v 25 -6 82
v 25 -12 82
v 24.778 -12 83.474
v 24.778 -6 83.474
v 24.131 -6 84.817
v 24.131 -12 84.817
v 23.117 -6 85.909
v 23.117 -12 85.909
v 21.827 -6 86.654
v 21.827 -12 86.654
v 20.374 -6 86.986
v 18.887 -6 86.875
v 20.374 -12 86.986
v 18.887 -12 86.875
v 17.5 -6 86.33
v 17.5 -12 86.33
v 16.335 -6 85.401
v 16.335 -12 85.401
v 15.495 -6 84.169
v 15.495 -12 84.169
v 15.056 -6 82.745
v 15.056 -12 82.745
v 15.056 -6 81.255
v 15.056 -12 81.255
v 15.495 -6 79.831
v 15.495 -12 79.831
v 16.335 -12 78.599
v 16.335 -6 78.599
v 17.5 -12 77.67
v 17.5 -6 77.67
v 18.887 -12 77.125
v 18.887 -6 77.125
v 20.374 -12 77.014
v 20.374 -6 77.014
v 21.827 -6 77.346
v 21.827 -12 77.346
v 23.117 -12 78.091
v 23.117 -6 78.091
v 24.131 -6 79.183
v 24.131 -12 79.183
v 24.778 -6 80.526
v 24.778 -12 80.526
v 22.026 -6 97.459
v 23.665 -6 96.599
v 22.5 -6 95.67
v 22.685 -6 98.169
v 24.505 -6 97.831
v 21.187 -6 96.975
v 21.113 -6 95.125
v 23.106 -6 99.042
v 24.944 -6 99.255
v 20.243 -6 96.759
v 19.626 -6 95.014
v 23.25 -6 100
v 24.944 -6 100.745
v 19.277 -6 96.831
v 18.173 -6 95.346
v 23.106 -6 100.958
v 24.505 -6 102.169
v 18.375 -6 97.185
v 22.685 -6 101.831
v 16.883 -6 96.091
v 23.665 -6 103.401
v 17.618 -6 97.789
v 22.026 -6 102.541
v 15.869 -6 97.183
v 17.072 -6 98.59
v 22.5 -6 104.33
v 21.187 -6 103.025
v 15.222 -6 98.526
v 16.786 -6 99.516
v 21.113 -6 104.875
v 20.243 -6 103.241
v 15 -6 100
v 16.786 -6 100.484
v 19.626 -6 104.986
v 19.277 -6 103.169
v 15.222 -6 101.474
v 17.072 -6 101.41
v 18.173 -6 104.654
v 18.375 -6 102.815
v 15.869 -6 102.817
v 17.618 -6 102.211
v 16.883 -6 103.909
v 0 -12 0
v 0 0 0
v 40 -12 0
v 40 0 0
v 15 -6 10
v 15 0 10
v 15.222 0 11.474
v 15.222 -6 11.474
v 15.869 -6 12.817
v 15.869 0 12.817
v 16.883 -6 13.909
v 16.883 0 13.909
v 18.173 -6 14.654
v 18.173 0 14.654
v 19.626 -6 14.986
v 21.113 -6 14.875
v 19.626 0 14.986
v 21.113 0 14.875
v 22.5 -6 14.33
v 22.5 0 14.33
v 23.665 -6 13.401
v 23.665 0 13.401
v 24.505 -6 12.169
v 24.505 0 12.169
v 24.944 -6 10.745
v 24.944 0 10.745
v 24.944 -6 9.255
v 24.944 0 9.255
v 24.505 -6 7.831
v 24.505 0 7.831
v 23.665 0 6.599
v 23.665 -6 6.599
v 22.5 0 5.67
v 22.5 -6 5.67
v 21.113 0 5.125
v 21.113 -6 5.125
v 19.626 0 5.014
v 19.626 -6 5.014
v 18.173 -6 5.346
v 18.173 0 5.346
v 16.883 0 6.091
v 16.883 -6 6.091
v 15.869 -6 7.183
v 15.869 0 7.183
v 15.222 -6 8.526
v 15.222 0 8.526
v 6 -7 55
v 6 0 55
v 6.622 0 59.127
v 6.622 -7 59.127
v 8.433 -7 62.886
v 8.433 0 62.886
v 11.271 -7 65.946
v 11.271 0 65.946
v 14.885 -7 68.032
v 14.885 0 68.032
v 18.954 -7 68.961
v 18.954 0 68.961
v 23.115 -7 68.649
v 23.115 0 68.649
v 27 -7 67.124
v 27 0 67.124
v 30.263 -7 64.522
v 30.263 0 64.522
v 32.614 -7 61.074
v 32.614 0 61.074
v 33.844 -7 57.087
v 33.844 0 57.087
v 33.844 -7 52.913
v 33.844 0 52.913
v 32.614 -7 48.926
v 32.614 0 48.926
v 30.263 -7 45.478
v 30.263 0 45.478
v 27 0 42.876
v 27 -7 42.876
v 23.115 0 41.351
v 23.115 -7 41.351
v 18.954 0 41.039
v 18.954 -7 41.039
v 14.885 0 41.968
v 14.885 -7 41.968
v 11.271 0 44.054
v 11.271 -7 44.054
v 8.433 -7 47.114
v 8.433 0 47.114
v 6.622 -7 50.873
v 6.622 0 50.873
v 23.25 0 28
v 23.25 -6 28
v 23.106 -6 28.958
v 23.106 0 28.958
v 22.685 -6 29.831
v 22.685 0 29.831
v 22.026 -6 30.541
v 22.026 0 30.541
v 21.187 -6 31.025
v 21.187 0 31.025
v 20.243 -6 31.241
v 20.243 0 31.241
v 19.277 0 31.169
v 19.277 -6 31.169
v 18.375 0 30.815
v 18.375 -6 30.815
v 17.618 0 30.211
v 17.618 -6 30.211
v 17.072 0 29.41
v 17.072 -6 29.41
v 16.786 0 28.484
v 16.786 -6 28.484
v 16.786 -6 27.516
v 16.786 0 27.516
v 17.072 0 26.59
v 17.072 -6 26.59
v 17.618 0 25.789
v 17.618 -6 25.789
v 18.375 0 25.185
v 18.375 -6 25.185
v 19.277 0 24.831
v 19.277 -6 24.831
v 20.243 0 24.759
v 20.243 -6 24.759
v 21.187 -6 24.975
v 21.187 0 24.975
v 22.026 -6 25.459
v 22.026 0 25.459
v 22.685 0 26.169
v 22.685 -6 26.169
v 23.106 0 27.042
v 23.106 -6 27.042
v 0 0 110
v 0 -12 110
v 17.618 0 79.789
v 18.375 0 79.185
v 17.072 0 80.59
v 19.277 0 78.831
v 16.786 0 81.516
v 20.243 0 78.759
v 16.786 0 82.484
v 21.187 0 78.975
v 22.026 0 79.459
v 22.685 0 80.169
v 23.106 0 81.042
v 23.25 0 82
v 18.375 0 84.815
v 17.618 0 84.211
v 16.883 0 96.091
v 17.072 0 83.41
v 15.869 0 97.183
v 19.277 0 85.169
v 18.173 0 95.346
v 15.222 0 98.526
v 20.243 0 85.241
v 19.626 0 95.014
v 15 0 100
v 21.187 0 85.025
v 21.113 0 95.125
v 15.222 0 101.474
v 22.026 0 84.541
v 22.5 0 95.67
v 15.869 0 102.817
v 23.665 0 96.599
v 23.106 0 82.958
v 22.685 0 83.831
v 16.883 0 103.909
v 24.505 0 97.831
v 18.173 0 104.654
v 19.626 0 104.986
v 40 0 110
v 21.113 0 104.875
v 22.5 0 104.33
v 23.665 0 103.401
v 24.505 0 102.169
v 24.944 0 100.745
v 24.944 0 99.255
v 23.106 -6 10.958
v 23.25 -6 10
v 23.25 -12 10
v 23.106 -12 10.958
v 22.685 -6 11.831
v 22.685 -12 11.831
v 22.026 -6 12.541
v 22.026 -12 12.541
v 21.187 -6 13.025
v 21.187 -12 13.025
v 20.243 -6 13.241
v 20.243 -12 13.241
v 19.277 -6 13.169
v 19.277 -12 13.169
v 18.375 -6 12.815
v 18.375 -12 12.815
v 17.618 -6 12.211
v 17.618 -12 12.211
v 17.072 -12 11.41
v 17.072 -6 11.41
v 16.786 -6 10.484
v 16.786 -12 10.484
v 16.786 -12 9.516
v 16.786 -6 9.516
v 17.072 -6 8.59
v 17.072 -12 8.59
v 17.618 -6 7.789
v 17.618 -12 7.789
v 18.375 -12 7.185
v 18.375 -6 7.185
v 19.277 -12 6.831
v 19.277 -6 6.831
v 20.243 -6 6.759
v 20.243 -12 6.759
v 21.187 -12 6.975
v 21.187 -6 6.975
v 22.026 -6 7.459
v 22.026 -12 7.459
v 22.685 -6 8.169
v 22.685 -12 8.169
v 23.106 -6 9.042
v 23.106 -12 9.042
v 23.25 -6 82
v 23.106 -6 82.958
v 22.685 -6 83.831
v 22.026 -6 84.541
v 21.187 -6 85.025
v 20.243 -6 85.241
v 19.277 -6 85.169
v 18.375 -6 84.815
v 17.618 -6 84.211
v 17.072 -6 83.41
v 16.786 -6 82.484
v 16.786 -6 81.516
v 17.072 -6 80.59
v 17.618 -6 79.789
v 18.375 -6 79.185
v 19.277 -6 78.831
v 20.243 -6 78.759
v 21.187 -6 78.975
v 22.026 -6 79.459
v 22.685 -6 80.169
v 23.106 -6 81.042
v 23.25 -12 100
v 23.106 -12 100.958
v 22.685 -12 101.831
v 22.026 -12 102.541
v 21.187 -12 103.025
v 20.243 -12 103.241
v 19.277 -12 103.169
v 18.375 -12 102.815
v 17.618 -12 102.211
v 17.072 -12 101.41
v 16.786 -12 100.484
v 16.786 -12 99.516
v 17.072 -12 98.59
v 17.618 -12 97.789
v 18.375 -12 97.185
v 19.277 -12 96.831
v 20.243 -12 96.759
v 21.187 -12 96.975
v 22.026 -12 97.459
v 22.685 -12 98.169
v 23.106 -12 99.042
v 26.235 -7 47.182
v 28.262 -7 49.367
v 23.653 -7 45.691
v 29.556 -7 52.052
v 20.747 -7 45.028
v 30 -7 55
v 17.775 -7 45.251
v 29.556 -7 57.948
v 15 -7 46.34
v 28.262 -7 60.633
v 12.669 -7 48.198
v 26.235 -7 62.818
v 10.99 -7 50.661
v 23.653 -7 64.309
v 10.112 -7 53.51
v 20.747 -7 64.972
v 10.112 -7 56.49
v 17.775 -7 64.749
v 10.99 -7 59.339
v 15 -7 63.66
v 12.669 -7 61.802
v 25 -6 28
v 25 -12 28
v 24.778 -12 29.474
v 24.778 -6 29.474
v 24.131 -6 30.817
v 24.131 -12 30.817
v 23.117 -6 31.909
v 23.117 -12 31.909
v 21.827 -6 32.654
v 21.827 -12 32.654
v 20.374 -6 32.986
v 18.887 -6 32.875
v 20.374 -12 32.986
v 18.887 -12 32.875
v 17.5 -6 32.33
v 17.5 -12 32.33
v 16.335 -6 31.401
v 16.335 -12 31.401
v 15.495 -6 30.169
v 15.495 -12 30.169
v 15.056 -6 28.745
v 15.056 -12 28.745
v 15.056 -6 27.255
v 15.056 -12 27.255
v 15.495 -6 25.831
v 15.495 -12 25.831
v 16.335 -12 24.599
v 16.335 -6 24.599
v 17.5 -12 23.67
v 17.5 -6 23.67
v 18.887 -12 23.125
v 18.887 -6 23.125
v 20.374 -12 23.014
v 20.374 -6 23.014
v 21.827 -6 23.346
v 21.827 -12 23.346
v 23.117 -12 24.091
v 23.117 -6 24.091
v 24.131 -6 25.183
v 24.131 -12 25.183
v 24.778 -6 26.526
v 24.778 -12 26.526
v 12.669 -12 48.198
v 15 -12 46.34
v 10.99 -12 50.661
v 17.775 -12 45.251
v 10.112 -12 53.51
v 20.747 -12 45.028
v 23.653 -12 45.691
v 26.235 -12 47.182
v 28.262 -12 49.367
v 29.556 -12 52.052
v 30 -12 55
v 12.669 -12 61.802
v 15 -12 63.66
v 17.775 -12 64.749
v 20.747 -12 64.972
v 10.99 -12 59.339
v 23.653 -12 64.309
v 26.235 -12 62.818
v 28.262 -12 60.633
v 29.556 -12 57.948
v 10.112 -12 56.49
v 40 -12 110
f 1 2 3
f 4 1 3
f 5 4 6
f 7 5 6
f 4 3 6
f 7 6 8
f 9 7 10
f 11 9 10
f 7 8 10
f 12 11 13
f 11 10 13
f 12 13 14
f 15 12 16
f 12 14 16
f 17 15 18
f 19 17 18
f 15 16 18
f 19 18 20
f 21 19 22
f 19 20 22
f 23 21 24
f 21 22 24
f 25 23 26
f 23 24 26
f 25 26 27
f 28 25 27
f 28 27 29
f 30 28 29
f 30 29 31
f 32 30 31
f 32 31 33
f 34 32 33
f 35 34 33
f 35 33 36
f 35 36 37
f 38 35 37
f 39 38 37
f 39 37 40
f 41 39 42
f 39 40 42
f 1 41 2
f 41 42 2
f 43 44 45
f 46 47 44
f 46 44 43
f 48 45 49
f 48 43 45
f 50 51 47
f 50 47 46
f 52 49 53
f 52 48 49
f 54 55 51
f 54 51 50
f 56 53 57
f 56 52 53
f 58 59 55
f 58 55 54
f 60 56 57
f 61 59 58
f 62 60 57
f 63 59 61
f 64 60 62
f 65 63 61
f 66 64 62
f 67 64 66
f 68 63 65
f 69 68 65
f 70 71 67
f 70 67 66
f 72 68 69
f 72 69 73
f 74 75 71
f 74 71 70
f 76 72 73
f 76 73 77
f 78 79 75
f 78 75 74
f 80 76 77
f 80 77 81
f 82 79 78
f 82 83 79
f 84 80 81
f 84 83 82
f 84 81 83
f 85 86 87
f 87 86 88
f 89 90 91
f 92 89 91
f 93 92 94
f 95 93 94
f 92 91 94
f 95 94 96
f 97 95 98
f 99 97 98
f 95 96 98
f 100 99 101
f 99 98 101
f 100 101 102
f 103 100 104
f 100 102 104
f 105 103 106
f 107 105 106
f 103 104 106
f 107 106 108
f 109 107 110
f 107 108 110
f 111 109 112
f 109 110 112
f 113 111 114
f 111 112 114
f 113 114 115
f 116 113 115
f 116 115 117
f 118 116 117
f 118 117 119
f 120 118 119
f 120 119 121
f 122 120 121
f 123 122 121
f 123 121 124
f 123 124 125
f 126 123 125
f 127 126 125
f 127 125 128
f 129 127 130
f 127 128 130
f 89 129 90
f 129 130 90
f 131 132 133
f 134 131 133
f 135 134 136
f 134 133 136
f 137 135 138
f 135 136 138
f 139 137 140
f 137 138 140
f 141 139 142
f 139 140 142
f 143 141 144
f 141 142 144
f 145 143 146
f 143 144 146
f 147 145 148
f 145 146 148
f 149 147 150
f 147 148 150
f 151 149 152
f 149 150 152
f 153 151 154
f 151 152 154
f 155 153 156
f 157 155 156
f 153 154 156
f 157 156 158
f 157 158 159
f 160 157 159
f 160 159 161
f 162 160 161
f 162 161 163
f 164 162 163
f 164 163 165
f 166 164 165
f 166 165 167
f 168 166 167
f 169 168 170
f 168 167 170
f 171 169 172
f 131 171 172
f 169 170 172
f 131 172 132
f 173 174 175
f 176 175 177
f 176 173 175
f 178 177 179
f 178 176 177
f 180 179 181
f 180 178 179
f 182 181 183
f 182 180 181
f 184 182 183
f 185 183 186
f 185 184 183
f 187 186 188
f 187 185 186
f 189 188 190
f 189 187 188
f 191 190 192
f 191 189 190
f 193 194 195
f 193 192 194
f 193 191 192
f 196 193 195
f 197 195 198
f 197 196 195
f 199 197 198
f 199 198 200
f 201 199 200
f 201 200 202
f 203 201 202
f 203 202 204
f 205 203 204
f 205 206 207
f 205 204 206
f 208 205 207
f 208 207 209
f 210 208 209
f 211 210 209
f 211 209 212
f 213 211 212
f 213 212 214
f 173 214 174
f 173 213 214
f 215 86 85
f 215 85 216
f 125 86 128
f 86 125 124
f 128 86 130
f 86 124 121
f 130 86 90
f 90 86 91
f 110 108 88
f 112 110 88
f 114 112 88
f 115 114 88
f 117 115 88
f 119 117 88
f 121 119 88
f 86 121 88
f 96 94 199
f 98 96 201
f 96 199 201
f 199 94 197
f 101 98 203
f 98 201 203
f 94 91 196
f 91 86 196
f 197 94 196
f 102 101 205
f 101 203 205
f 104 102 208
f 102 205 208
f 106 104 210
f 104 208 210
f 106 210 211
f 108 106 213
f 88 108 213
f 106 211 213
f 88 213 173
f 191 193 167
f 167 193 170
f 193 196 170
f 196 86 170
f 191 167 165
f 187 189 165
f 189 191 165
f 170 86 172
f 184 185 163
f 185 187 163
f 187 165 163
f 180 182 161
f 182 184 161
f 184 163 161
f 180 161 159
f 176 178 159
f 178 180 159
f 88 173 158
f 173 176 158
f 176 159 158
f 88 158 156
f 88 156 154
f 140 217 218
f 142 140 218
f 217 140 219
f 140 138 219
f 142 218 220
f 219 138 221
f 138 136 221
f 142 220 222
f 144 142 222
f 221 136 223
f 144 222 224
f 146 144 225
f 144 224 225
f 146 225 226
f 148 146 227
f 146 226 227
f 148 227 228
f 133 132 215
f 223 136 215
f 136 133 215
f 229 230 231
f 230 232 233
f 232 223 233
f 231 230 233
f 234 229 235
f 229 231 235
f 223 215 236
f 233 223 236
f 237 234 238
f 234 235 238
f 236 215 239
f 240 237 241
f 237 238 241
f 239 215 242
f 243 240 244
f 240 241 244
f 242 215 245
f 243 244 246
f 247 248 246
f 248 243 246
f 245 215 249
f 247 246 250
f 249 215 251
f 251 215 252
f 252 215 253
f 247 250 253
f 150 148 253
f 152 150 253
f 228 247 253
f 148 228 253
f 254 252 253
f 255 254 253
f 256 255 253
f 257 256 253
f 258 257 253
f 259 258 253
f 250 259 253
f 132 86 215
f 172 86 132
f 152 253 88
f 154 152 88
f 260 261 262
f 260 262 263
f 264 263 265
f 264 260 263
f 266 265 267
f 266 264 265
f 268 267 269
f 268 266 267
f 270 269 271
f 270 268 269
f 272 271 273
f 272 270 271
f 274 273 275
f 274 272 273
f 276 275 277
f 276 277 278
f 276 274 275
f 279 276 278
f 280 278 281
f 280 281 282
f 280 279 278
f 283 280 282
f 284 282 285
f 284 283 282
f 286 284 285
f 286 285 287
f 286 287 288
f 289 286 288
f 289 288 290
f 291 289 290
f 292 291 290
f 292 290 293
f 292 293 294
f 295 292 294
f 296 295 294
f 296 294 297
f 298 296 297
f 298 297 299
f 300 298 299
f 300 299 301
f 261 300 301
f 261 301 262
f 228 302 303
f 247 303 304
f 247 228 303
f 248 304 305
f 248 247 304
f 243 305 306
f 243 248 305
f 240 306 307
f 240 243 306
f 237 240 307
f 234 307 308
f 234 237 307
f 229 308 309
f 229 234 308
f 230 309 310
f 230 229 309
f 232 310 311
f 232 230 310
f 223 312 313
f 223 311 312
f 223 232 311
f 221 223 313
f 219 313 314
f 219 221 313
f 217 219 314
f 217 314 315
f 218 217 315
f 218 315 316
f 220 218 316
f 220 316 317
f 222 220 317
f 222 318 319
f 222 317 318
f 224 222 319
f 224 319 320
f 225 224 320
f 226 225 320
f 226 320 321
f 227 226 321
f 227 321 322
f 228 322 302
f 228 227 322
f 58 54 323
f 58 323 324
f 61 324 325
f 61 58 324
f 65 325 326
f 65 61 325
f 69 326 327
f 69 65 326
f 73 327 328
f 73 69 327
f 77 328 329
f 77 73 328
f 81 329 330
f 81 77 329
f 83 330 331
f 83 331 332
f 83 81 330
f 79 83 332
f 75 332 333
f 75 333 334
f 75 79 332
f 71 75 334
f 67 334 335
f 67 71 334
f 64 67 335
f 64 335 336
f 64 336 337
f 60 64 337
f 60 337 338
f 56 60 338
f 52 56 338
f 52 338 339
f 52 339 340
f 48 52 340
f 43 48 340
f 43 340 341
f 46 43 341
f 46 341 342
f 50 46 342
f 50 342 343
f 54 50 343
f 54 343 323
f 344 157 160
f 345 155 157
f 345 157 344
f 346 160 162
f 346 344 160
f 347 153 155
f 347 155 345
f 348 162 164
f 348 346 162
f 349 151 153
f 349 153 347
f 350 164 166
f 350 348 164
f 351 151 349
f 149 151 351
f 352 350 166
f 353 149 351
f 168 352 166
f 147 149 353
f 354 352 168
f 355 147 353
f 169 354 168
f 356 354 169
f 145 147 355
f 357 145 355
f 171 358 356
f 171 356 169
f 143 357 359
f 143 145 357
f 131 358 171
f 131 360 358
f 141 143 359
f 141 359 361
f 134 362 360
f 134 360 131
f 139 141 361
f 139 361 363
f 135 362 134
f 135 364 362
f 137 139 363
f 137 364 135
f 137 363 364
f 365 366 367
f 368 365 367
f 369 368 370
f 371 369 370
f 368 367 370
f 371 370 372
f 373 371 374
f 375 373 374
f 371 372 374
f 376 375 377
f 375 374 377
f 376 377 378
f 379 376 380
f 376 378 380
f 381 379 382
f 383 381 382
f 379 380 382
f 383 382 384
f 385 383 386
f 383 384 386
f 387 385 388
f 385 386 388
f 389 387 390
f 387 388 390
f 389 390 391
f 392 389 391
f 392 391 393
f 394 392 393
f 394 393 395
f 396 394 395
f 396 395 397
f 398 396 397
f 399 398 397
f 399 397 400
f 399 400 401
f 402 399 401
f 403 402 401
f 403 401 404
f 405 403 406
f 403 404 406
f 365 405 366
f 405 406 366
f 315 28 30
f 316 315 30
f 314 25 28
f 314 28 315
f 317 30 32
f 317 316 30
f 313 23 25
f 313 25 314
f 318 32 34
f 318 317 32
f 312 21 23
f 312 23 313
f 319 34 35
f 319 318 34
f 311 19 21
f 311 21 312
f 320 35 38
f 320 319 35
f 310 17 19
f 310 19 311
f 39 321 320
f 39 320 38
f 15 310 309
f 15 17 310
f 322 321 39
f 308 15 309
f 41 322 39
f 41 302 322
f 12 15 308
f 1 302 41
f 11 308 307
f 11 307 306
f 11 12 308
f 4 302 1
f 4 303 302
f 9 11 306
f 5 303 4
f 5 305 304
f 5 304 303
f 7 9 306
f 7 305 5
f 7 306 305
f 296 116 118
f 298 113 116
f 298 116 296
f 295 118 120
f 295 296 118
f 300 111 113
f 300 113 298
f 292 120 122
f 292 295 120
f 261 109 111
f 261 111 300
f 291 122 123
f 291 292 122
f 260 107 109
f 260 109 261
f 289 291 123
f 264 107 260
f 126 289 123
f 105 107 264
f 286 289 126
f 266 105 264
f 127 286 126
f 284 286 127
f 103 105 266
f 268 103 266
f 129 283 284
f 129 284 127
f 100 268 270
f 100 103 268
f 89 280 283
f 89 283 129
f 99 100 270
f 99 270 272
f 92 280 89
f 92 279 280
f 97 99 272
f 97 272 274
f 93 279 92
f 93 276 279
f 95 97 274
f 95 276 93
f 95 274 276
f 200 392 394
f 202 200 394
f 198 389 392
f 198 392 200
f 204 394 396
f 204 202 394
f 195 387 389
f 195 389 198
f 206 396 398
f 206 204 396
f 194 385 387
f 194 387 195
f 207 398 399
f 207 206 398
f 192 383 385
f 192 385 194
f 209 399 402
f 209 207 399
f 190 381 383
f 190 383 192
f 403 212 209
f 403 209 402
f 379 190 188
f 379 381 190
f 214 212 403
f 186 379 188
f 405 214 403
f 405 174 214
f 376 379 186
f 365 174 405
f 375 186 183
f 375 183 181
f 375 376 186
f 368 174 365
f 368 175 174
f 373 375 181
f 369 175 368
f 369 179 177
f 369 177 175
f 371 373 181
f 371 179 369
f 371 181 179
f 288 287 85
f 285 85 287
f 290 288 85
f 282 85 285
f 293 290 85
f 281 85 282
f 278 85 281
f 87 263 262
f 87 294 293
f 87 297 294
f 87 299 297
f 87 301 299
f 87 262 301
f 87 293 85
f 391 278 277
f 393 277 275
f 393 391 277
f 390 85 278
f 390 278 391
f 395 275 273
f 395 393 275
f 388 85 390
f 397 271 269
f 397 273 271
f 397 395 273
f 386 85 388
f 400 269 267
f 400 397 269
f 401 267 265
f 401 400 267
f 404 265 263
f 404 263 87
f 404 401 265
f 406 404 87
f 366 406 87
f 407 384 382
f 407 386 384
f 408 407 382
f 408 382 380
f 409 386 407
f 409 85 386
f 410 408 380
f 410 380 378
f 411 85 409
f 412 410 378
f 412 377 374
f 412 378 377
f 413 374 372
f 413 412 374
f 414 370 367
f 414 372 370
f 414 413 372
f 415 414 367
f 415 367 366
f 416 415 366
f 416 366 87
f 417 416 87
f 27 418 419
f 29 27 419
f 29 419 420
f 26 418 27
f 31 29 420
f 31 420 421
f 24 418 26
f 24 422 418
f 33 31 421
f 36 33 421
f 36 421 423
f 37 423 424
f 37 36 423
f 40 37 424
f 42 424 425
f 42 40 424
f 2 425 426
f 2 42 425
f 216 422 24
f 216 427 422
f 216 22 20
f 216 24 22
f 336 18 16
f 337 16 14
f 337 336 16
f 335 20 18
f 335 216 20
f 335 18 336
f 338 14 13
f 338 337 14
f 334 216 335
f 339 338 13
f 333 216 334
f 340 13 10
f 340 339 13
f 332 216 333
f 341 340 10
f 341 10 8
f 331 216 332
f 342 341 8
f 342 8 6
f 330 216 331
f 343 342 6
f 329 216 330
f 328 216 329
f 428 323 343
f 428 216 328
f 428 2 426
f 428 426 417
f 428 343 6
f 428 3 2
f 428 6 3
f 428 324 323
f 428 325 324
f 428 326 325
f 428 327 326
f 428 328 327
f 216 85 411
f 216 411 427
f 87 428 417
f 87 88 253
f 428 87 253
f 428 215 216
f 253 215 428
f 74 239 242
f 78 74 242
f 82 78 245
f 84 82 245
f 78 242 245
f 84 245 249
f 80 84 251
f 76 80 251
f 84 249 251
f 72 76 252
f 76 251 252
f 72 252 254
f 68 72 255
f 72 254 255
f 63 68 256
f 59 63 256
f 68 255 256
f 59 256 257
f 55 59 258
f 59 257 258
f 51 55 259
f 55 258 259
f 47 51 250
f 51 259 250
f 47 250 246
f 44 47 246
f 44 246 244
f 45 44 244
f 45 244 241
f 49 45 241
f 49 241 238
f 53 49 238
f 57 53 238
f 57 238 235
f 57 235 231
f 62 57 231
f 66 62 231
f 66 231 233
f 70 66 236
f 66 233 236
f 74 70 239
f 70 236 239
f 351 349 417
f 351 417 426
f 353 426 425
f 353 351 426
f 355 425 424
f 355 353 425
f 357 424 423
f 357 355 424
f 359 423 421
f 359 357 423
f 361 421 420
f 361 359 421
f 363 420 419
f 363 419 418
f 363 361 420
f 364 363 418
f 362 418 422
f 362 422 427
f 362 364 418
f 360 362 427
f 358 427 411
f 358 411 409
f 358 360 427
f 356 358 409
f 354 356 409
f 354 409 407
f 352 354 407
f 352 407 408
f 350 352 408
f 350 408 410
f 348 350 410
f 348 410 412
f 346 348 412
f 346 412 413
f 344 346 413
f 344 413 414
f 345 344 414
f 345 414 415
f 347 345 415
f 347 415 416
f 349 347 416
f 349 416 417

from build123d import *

# Parameters (mm, degrees)
F0_W     = 40
F0_H     = 110
F0_R     = 3.25
F0_R_2   = 10
F1_DEPTH = 12
F2_R     = 5
F3_DEPTH = 6
F4_R     = 5
F5_DEPTH = 6
F6_R     = 14
F6_R_2   = 10
F7_DEPTH = 7


with BuildPart() as f1:
    # F0 (on Front) → F1 (new body)
    with BuildSketch(Plane.XZ):
        with Locations((20, 55)):
            Rectangle(F0_W, F0_H)
        with Locations((20, 10)):
            Circle(F0_R, mode=Mode.SUBTRACT)
        with Locations((20, 28)):
            Circle(F0_R, mode=Mode.SUBTRACT)
        with Locations((20, 55)):
            Circle(F0_R_2, mode=Mode.SUBTRACT)
        with Locations((20, 82)):
            Circle(F0_R, mode=Mode.SUBTRACT)
        with Locations((20, 100)):
            Circle(F0_R, mode=Mode.SUBTRACT)
    extrude(amount=F1_DEPTH)

    # F2 (on face) → F3 (cut)
    with BuildSketch(Plane.XZ.offset(12)):
        with Locations((20, 82)):
            Circle(F2_R)
        with Locations((20, 28)):
            Circle(F2_R)
    extrude(amount=-F3_DEPTH, mode=Mode.SUBTRACT)

    # F4 (on face) → F5 (cut)
    with BuildSketch(Plane(origin=(0, 0, 0), x_dir=(-1, 0, 0), z_dir=(0, 1, 0))):
        with Locations((-20, 100)):
            Circle(F4_R)
        with Locations((-20, 10)):
            Circle(F4_R)
    extrude(amount=-F5_DEPTH, mode=Mode.SUBTRACT)

    # F6 (on face) → F7 (cut)
    with BuildSketch(Plane(origin=(0, 0, 0), x_dir=(-1, 0, 0), z_dir=(0, 1, 0))):
        with Locations((-20, 55)):
            Circle(F6_R)
        with Locations((-20, 55)):
            Circle(F6_R_2, mode=Mode.SUBTRACT)
    extrude(amount=-F7_DEPTH, mode=Mode.SUBTRACT)


solid = f1.part
